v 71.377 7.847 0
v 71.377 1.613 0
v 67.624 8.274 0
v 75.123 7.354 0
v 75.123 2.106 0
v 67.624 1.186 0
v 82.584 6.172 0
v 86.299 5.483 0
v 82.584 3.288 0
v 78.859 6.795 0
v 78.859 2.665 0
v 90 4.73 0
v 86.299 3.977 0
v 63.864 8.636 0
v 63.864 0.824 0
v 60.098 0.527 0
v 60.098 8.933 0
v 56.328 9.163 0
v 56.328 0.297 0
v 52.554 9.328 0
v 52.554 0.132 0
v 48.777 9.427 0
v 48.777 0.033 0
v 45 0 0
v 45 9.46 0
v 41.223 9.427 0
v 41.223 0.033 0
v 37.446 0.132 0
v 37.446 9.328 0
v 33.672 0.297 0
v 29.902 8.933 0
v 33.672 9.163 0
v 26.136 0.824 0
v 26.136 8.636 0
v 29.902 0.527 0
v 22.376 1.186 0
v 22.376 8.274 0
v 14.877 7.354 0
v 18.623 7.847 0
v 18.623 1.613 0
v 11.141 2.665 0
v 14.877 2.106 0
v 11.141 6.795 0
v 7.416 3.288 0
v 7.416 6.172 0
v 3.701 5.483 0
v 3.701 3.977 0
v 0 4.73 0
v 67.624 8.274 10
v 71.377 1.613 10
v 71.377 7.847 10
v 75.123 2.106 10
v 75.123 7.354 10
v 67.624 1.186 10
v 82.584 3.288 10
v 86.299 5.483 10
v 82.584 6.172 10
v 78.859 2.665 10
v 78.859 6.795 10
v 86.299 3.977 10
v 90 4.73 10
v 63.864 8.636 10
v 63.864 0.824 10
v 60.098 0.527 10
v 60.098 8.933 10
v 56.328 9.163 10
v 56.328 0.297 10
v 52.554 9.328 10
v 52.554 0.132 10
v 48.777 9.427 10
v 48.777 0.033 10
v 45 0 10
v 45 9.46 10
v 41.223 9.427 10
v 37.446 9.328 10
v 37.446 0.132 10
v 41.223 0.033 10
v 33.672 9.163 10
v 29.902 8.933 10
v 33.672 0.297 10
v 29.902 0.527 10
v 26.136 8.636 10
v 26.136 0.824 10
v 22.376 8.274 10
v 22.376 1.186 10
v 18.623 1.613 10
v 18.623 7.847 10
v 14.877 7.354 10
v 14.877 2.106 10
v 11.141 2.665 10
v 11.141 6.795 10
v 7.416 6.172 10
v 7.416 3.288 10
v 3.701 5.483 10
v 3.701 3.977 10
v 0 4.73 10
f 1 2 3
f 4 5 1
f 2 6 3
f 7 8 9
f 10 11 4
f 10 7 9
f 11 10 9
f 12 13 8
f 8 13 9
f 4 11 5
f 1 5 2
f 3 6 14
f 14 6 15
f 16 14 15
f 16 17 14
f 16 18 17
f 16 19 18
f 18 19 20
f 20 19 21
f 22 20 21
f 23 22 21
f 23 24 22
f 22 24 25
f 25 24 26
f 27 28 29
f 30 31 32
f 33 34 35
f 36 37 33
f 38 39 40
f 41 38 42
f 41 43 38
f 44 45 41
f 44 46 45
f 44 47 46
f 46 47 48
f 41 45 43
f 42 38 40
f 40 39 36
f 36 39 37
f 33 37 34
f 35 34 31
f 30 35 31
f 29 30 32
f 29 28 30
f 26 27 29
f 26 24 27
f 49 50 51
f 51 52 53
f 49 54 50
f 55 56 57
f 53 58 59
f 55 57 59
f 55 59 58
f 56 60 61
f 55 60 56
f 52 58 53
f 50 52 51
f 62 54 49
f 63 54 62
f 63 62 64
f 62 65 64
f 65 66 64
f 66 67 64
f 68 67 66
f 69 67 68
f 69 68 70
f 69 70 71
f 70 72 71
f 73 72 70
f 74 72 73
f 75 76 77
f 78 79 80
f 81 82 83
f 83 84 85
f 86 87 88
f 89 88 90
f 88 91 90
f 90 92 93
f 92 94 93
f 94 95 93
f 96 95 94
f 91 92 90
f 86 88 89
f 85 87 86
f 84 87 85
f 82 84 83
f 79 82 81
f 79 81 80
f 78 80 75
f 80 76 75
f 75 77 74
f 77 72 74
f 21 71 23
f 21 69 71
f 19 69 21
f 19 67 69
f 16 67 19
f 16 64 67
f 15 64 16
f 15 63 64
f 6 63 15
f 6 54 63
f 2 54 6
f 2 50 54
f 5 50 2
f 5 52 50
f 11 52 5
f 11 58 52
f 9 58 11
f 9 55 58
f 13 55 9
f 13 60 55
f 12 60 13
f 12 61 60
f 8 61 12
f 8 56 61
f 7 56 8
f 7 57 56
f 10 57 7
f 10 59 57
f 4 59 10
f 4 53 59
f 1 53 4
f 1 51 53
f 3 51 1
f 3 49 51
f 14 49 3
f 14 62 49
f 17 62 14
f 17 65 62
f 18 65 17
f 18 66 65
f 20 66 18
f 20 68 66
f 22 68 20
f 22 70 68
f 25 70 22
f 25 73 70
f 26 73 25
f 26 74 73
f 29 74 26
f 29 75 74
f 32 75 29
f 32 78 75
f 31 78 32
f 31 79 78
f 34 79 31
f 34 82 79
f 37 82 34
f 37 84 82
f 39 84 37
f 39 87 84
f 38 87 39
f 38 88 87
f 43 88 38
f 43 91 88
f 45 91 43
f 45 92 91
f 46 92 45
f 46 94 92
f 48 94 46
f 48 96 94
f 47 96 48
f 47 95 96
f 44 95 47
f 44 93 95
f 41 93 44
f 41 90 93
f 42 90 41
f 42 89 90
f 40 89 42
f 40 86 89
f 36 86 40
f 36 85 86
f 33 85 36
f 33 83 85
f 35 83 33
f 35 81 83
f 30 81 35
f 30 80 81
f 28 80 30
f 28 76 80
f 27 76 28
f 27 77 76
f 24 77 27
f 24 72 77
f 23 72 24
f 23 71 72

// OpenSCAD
$fn = 32;

// ----------------------------------------------------------------------
// Arc profile plate: lens, 48 points
// ----------------------------------------------------------------------

// --- parameters (mm) ---
lens_chord = 90;          // chord length of the lens, X
arc_r = 216.44;           // radius of both arcs
arc_angle = 24;           // angle of each arc, degrees
sagitta = 4.73;           // bulge of each arc (half the lens height)
arc_step = 1;             // sampling step of the arcs, degrees
plate_t = 10;             // plate thickness, Z

bbox_y = 2 * sagitta;  // full lens height

profile = [[90, 4.73], [86.299, 5.483], [82.584, 6.172], [78.859, 6.795], [75.123, 7.354], [71.377, 7.847], [67.624, 8.274], [63.864, 8.636], [60.098, 8.933], [56.328, 9.163], [52.554, 9.328], [48.777, 9.427], [45, 9.46], [41.223, 9.427], [37.446, 9.328], [33.672, 9.163], [29.902, 8.933], [26.136, 8.636], [22.376, 8.274], [18.623, 7.847], [14.877, 7.354], [11.141, 6.795], [7.416, 6.172], [3.701, 5.483], [0, 4.73], [3.701, 3.977], [7.416, 3.288], [11.141, 2.665], [14.877, 2.106], [18.623, 1.613], [22.376, 1.186], [26.136, 0.824], [29.902, 0.527], [33.672, 0.297], [37.446, 0.132], [41.223, 0.033], [45, 0], [48.777, 0.033], [52.554, 0.132], [56.328, 0.297], [60.098, 0.527], [63.864, 0.824], [67.624, 1.186], [71.377, 1.613], [75.123, 2.106], [78.859, 2.665], [82.584, 3.288], [86.299, 3.977]];  // primary outline, 48 points, counter clockwise

// --- the one profile operation ---
linear_extrude(height = plate_t) polygon(points = profile);
